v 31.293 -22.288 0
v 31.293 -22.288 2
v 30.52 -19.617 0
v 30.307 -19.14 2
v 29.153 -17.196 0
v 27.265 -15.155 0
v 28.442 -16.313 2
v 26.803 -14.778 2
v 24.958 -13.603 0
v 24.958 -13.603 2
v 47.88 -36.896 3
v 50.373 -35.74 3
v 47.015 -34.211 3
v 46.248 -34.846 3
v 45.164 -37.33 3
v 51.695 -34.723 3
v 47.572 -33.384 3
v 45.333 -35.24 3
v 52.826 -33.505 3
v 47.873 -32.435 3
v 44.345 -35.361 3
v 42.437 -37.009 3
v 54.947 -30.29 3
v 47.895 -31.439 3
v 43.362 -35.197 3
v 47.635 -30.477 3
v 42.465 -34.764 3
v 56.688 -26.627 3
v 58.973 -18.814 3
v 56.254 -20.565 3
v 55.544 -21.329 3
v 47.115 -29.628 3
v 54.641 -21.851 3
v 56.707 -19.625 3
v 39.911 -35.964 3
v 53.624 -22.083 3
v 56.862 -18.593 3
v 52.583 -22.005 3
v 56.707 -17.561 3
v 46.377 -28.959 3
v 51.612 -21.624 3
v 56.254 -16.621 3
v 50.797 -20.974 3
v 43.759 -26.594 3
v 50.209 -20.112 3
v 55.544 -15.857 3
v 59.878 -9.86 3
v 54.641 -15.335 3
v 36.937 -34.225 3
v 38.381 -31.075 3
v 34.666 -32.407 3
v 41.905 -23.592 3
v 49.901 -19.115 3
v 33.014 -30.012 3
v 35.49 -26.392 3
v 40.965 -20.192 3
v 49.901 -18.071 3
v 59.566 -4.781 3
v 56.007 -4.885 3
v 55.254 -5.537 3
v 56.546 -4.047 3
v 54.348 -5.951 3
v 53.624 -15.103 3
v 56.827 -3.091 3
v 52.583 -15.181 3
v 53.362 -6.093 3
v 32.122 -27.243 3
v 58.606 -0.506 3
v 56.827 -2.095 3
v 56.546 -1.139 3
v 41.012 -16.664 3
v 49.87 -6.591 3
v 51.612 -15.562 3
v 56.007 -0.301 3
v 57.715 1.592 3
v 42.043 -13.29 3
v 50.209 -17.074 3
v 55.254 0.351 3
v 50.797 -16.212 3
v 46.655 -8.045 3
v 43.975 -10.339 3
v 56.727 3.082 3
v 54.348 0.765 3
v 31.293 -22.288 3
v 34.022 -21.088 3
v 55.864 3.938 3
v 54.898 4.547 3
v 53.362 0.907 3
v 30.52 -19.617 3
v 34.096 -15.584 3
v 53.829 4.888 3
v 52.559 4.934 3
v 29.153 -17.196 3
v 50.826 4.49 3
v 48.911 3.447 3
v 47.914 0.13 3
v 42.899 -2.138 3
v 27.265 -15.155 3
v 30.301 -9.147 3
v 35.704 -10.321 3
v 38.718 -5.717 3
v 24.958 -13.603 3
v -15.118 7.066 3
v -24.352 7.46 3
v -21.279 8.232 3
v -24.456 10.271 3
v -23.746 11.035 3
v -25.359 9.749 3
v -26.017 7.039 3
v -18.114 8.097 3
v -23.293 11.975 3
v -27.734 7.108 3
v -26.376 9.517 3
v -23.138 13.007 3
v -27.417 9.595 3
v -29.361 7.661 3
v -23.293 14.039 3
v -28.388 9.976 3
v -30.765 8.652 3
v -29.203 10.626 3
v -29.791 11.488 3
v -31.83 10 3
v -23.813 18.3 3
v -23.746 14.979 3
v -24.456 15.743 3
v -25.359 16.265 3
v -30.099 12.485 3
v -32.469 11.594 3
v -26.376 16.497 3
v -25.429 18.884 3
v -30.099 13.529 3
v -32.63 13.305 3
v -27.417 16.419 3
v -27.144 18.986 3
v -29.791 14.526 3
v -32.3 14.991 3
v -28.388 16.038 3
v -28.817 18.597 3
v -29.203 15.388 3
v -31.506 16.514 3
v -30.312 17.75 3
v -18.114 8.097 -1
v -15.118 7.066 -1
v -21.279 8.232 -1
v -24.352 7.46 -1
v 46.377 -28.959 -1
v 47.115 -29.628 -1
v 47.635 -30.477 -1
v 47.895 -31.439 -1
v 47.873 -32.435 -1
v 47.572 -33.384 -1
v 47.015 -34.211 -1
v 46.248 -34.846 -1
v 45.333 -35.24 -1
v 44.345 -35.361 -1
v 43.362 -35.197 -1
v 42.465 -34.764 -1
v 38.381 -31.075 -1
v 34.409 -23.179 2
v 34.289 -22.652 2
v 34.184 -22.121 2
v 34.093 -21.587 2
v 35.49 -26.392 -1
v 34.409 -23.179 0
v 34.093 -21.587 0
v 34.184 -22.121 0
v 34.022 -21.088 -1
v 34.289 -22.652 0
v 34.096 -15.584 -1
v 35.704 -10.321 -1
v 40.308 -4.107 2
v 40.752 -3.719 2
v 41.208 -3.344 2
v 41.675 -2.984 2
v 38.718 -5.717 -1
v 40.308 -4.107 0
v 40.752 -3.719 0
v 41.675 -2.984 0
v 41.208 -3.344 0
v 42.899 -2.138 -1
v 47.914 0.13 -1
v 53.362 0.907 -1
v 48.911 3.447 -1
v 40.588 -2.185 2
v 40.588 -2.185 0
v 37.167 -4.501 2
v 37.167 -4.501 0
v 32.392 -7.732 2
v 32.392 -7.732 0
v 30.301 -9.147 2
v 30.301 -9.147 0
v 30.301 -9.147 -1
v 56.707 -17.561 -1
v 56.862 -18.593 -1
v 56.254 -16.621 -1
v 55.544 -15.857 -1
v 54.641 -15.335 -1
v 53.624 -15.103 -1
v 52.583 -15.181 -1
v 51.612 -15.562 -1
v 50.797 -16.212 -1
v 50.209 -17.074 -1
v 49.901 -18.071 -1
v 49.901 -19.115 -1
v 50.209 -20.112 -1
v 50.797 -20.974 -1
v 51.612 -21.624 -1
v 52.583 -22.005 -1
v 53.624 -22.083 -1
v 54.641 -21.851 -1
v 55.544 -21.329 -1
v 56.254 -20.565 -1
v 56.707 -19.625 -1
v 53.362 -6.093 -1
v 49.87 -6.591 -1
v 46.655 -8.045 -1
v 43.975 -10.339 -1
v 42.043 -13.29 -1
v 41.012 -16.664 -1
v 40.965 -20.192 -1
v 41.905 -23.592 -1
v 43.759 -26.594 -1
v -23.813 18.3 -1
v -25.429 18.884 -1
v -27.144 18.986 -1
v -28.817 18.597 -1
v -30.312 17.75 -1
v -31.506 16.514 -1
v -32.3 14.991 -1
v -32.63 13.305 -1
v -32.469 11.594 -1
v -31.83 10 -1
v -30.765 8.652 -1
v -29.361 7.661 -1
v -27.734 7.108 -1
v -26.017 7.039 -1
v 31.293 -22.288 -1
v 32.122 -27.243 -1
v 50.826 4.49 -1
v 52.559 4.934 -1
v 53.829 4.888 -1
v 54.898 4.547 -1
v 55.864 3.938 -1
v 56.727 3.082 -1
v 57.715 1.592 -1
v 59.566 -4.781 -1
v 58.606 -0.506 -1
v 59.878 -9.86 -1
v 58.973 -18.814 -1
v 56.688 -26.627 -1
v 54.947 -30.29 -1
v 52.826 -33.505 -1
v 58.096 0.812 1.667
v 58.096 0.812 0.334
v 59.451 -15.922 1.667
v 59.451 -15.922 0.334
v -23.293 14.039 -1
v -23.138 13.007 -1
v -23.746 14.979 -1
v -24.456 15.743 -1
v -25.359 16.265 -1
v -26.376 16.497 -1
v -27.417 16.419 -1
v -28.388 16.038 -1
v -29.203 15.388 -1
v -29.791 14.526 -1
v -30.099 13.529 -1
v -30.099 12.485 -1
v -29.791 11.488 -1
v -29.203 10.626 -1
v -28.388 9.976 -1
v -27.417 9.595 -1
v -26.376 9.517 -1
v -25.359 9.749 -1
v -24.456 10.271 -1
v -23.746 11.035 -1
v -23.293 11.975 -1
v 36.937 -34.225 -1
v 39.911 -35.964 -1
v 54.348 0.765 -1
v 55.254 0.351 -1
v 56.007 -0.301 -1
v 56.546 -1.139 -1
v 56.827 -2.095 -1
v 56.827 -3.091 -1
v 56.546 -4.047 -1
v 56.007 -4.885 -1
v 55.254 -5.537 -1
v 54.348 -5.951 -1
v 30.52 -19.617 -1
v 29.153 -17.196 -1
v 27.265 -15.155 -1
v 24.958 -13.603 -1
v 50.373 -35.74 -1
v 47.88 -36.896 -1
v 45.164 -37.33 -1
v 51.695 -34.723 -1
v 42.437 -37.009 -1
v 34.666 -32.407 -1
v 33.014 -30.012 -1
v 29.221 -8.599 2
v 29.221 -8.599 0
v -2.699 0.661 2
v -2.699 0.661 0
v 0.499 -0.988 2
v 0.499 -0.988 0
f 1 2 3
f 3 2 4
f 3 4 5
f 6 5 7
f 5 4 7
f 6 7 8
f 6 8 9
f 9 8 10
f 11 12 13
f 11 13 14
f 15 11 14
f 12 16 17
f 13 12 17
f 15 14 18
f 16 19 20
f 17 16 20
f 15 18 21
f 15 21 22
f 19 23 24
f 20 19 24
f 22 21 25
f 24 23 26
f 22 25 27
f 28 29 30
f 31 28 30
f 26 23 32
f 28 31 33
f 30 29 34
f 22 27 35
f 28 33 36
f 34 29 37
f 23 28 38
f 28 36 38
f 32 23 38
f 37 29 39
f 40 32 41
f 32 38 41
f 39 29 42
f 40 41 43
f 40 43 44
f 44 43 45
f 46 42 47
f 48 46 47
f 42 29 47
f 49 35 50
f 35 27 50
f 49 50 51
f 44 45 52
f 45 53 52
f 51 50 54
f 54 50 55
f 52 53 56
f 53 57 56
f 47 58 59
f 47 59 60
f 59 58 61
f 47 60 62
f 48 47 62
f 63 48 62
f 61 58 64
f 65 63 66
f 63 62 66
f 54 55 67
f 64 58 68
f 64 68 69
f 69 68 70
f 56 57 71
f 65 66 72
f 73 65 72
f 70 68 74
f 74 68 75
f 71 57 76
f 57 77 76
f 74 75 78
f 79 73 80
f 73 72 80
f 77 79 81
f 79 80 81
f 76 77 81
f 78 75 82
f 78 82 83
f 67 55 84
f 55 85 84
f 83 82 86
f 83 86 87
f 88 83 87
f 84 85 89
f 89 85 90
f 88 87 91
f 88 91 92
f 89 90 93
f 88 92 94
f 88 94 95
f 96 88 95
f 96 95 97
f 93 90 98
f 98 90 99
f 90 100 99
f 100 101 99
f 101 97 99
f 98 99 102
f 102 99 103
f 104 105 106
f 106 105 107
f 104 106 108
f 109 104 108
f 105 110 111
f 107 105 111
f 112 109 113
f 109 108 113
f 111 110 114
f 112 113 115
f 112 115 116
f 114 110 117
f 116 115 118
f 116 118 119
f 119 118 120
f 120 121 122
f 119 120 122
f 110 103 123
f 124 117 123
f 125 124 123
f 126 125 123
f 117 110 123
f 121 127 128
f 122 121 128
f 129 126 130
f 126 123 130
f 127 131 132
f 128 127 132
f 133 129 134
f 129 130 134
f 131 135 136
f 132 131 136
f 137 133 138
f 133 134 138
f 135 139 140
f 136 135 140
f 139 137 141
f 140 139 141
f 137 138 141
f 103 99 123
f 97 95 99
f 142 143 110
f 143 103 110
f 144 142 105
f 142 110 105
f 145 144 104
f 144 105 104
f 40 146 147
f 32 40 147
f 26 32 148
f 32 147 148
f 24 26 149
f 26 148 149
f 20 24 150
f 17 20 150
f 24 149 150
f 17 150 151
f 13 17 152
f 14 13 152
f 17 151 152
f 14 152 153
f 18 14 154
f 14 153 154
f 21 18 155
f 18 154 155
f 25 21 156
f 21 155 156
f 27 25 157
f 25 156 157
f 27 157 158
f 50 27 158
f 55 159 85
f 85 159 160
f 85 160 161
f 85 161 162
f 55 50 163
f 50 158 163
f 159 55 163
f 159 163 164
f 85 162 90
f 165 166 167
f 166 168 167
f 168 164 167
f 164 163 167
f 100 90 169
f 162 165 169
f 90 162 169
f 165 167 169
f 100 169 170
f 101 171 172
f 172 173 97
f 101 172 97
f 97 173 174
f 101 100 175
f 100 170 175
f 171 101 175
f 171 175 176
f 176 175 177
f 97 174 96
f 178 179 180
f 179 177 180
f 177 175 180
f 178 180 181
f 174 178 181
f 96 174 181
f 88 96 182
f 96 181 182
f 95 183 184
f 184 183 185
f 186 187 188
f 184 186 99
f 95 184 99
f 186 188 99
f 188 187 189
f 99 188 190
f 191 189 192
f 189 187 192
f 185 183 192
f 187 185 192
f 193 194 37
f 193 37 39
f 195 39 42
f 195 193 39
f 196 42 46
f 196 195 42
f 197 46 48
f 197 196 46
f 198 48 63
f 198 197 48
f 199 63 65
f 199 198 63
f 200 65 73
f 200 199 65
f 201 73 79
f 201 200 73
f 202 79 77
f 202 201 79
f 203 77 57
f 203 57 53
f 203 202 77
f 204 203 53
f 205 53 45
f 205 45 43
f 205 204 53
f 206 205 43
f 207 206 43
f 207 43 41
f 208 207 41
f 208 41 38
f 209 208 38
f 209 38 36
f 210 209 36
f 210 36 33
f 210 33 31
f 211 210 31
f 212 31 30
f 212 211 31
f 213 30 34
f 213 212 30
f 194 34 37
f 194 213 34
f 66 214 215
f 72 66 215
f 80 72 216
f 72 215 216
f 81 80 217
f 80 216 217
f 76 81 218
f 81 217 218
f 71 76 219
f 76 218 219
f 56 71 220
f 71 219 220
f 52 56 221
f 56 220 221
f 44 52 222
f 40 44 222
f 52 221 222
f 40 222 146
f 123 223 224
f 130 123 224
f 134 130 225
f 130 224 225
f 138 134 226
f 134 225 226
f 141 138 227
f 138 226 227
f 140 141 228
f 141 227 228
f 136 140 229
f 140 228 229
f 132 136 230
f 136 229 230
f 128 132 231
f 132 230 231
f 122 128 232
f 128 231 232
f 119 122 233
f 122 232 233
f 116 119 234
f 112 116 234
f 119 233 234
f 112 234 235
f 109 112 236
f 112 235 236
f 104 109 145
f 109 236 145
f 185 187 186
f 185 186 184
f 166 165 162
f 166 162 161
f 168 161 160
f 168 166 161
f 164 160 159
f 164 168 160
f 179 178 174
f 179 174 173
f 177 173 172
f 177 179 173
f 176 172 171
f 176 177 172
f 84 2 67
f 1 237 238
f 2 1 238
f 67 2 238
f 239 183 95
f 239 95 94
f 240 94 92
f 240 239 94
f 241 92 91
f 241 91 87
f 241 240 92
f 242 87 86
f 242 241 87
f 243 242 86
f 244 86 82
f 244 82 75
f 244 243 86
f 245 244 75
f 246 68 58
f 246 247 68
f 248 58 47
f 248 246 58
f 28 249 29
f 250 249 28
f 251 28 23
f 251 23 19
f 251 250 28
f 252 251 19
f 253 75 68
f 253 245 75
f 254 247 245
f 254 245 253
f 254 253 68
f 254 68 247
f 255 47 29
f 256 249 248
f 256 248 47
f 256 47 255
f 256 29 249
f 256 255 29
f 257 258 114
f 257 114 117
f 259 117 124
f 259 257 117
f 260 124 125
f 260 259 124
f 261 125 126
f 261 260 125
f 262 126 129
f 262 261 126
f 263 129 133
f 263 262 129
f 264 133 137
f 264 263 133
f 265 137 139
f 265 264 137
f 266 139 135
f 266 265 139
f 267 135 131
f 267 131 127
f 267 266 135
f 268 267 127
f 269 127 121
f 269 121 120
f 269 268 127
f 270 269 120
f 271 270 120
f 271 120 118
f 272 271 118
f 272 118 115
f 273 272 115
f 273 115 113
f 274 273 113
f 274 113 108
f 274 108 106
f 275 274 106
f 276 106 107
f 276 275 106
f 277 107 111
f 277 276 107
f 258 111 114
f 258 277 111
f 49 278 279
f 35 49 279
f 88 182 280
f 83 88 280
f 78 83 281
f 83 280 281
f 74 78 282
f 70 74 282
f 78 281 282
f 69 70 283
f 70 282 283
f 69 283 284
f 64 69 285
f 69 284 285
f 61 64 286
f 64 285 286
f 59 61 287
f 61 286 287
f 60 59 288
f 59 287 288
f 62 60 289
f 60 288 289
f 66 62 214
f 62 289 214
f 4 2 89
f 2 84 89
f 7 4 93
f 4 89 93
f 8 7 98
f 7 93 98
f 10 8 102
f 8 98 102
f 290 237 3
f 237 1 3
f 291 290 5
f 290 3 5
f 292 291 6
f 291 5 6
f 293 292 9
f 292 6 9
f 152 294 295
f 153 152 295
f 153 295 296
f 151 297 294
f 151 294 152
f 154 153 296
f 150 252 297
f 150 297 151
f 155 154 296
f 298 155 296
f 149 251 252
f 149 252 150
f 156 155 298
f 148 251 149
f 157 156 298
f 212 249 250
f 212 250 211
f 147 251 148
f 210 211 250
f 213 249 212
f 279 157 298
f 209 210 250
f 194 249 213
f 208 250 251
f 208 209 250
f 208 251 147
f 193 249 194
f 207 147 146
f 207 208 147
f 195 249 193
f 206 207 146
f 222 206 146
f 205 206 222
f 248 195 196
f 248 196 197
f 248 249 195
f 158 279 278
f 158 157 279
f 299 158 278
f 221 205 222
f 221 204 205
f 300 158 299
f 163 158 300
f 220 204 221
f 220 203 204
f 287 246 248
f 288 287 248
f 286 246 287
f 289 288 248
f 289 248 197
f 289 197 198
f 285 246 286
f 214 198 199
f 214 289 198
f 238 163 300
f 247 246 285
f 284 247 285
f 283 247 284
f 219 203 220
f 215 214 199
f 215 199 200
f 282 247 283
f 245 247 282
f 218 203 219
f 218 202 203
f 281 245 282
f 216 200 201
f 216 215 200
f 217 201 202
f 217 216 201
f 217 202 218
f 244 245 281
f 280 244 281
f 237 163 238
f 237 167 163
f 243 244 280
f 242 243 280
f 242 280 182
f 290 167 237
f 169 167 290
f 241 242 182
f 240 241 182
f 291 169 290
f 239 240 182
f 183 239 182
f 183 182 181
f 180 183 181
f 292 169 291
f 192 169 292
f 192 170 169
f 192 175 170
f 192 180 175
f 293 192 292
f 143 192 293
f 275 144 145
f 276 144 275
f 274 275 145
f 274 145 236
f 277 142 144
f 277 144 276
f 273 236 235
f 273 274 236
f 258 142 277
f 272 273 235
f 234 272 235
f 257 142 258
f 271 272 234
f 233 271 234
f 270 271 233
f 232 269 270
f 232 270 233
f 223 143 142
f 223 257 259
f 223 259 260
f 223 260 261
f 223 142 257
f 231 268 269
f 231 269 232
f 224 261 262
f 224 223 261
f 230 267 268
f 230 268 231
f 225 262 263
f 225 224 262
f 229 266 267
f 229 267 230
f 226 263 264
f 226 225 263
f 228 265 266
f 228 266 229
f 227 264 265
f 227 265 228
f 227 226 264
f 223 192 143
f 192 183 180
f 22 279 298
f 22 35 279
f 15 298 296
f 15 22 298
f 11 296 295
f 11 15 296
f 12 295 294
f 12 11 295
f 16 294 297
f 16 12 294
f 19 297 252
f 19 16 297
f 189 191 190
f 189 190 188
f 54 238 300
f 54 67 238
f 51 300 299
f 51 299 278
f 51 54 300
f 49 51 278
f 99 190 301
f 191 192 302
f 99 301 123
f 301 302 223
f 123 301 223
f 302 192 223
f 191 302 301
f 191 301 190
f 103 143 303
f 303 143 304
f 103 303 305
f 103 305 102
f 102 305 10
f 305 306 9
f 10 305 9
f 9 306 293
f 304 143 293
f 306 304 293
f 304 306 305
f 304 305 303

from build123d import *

# Parameters (mm, degrees)
SKETCH1_R           = 1.75
BOSS_EXTRUDE1_DEPTH = 2
SCALE1_DEPTH        = 2
SCALE1_START        = -0.999756802
SCALE1_2_OUTLINE_R  = 3.5
SCALE1_2_DEPTH      = 4
FILLET1_R           = 12
FILLET3_R           = 11
FILLET5_R           = 10


# Read off the part's stored shape, not the designer's step: Scale1
with BuildPart() as part:
    # Sketch1 → Boss-Extrude1 (new body)
    with BuildSketch(Plane.XY):
        with BuildLine():
            Line((37.774530777, -2.80976251), (28.469572838, -9.10701388))
            Line((28.469572838, -9.10701388), (1.412522165, 4.616654706))
            ThreePointArc((1.412522165, 4.616654706), (-2.864052097, 1.077136302), (2.666294703, 0.594909982))
            Line((2.666294703, 0.594909982), (28.469572838, -12.71263256))
            Line((28.469572838, -12.71263256), (29.76626198, -20.464203372))
            Line((29.76626198, -20.464203372), (35.819506235, -24.004020415))
            add(Edge.make_bspline(
                [(37.774530777, -2.80976251), (45.596954448, 2.484164502), (45.142122532, -21.709783765), (35.819506235, -24.004020415)],
                knots=[0, 0, 0, 0, 1, 1, 1, 1], degree=3))
        make_face()
        with Locations((0, 1.97)):
            Circle(SKETCH1_R, mode=Mode.SUBTRACT)
        with Locations((40, -13.83)):
            Circle(SKETCH1_R, mode=Mode.SUBTRACT)
        with BuildLine():
            ThreePointArc((40, -7.58), (41.75, -5.83), (40, -4.08))
            ThreePointArc((40, -4.08), (30.675422402, -10.981359514), (34.551308869, -21.91543536))
            ThreePointArc((34.551308869, -21.91543536), (36.98051106, -21.442173575), (36.507249275, -19.012971384))
            ThreePointArc((36.507249275, -19.012971384), (34.022706668, -12.003948406), (40, -7.58))
        make_face(mode=Mode.SUBTRACT)
    extrude(amount=BOSS_EXTRUDE1_DEPTH)

    # Scale1 outline → Scale1 (cut)
    with BuildSketch(Plane.XY):
        with BuildLine():
            Line((37.166911335, -4.500685523), (40.588309586, -2.185209734))
            add(Edge.make_bspline(
                [(37.774530777, -2.80976251), (38.877601708, -2.063244904), (39.816079935, -1.903091828), (40.588309586, -2.185209734)],
                knots=[0, 0, 0, 0, 0.141013959, 0.141013959, 0.141013959, 0.141013959], degree=3))
            Line((37.774530777, -2.80976251), (29.220510655, -8.598806941))
            Line((29.220510655, -8.598806941), (30.301368209, -9.147031174))
            Line((30.301368209, -9.147031174), (32.392388987, -7.731905652))
            ThreePointArc((32.392388987, -7.731905652), (34.535363844, -5.75533272), (37.166911335, -4.500685523))
        make_face()
        with BuildLine():
            add(Edge.make_bspline(
                [(41.674674498, -2.9836722), (42.973808679, -4.53190383), (43.478218434, -7.820529427), (43.170733001, -11.35535593)],
                knots=[0.215661709, 0.215661709, 0.215661709, 0.215661709, 0.523164808, 0.523164808, 0.523164808, 0.523164808], degree=3))
            ThreePointArc((41.674674498, -2.9836722), (40.978551915, -3.529979081), (40.307930669, -4.107304814))
            ThreePointArc((40.307930669, -4.107304814), (41.743160431, -5.984569442), (40, -7.58))
            ThreePointArc((40, -7.58), (38.251209419, -7.829647385), (36.642124757, -8.558645918))
            ThreePointArc((36.642124757, -8.558645918), (34.994244779, -12.045683869), (34.064898938, -15.788845421))
            ThreePointArc((34.064898938, -15.788845421), (35.018048135, -17.603944304), (36.507249275, -19.012971384))
            ThreePointArc((36.507249275, -19.012971384), (36.98051106, -21.442173575), (34.551308869, -21.91543536))
            ThreePointArc((34.551308869, -21.91543536), (34.320026917, -21.754670705), (34.093485318, -21.587292331))
            ThreePointArc((34.093485318, -21.587292331), (34.234790142, -22.386594073), (34.409236622, -23.179322749))
            Line((34.409236622, -23.179322749), (35.819506235, -24.004020415))
            add(Edge.make_bspline(
                [(40.894606009, -19.492190926), (39.678153764, -21.750341152), (37.988934356, -23.470137935), (35.819506235, -24.004020415)],
                knots=[0.767294067, 0.767294067, 0.767294067, 0.767294067, 1, 1, 1, 1], degree=3))
            ThreePointArc((40.894606009, -19.492190926), (40.948505364, -17.126843118), (41.447135601, -14.814021622))
            ThreePointArc((41.447135601, -14.814021622), (38.35159174, -13.242420041), (41.74328031, -13.983211488))
            ThreePointArc((41.74328031, -13.983211488), (42.378136793, -12.626441553), (43.170733001, -11.35535593))
        make_face()
        Polygon((29.76626198, -20.464203372), (31.120707631, -21.256256294), (30.301368209, -16.358268534), (28.964044419, -15.668569608), align=None)
        with BuildLine():
            ThreePointArc((-2.699495917, 0.661290027), (-1.375090017, -0.696294703), (0.498906862, -0.988224458))
            Line((0.498906862, -0.988224458), (-2.699495917, 0.661290027))
        make_face()
    extrude(amount=SCALE1_DEPTH, mode=Mode.SUBTRACT)

    # Scale1 2 outline → Scale1 2 (add)
    with BuildSketch(Plane.XY.offset(SCALE1_START)):
        with BuildLine():
            add(Edge.make_bspline(
                [(48.911284088, 3.447471566), (64.556131429, 14.03532559), (63.646467598, -34.352570942), (45.001235003, -38.941044242)],
                knots=[0, 0, 0, 0, 1, 1, 1, 1], degree=3))
            Line((48.911284088, 3.447471566), (30.301368209, -9.147031174))
            Line((30.301368209, -9.147031174), (-23.812733137, 18.300305999))
            ThreePointArc((-23.812733137, 18.300305999), (-32.365881661, 11.221269191), (-21.305188061, 10.256816551))
            Line((-21.305188061, 10.256816551), (30.301368209, -16.358268534))
            Line((30.301368209, -16.358268534), (32.894746493, -31.861410158))
            Line((32.894746493, -31.861410158), (45.001235003, -38.941044242))
        make_face()
        with BuildLine():
            ThreePointArc((42.464840271, -34.763874133), (34.713067338, -12.89572244), (53.362222534, 0.906996587))
            ThreePointArc((53.362222534, 0.906996587), (56.862222534, -2.593003413), (53.362222534, -6.093003413))
            ThreePointArc((53.362222534, -6.093003413), (41.40763587, -14.940900225), (46.376721083, -28.958946182))
            ThreePointArc((46.376721083, -28.958946182), (47.323244653, -33.817350564), (42.464840271, -34.763874133))
        make_face(mode=Mode.SUBTRACT)
        with Locations((53.362222534, -18.593003413)):
            Circle(SCALE1_2_OUTLINE_R, mode=Mode.SUBTRACT)
        with Locations((-26.637777466, 13.006996587)):
            Circle(SCALE1_2_OUTLINE_R, mode=Mode.SUBTRACT)
    extrude(amount=SCALE1_2_DEPTH)

    # Fillet1
    fillet1_edges = [part.edges().sort_by_distance(p)[0] for p in [
        (30.301368209, -16.358268534, 1),
    ]]
    fillet(fillet1_edges, radius=FILLET1_R)

    # Fillet3
    fillet3_edges = [part.edges().sort_by_distance(p)[0] for p in [
        (-21.305188061, 10.256816551, 1.000243198),
    ]]
    fillet(fillet3_edges, radius=FILLET3_R)

    # Fillet5
    fillet5_edges = [part.edges().sort_by_distance(p)[0] for p in [
        (45.001235003, -38.941044242, 1.000243198),
        (32.894746493, -31.861410158, 1.000243198),
    ]]
    fillet(fillet5_edges, radius=FILLET5_R)


solid = part.part
